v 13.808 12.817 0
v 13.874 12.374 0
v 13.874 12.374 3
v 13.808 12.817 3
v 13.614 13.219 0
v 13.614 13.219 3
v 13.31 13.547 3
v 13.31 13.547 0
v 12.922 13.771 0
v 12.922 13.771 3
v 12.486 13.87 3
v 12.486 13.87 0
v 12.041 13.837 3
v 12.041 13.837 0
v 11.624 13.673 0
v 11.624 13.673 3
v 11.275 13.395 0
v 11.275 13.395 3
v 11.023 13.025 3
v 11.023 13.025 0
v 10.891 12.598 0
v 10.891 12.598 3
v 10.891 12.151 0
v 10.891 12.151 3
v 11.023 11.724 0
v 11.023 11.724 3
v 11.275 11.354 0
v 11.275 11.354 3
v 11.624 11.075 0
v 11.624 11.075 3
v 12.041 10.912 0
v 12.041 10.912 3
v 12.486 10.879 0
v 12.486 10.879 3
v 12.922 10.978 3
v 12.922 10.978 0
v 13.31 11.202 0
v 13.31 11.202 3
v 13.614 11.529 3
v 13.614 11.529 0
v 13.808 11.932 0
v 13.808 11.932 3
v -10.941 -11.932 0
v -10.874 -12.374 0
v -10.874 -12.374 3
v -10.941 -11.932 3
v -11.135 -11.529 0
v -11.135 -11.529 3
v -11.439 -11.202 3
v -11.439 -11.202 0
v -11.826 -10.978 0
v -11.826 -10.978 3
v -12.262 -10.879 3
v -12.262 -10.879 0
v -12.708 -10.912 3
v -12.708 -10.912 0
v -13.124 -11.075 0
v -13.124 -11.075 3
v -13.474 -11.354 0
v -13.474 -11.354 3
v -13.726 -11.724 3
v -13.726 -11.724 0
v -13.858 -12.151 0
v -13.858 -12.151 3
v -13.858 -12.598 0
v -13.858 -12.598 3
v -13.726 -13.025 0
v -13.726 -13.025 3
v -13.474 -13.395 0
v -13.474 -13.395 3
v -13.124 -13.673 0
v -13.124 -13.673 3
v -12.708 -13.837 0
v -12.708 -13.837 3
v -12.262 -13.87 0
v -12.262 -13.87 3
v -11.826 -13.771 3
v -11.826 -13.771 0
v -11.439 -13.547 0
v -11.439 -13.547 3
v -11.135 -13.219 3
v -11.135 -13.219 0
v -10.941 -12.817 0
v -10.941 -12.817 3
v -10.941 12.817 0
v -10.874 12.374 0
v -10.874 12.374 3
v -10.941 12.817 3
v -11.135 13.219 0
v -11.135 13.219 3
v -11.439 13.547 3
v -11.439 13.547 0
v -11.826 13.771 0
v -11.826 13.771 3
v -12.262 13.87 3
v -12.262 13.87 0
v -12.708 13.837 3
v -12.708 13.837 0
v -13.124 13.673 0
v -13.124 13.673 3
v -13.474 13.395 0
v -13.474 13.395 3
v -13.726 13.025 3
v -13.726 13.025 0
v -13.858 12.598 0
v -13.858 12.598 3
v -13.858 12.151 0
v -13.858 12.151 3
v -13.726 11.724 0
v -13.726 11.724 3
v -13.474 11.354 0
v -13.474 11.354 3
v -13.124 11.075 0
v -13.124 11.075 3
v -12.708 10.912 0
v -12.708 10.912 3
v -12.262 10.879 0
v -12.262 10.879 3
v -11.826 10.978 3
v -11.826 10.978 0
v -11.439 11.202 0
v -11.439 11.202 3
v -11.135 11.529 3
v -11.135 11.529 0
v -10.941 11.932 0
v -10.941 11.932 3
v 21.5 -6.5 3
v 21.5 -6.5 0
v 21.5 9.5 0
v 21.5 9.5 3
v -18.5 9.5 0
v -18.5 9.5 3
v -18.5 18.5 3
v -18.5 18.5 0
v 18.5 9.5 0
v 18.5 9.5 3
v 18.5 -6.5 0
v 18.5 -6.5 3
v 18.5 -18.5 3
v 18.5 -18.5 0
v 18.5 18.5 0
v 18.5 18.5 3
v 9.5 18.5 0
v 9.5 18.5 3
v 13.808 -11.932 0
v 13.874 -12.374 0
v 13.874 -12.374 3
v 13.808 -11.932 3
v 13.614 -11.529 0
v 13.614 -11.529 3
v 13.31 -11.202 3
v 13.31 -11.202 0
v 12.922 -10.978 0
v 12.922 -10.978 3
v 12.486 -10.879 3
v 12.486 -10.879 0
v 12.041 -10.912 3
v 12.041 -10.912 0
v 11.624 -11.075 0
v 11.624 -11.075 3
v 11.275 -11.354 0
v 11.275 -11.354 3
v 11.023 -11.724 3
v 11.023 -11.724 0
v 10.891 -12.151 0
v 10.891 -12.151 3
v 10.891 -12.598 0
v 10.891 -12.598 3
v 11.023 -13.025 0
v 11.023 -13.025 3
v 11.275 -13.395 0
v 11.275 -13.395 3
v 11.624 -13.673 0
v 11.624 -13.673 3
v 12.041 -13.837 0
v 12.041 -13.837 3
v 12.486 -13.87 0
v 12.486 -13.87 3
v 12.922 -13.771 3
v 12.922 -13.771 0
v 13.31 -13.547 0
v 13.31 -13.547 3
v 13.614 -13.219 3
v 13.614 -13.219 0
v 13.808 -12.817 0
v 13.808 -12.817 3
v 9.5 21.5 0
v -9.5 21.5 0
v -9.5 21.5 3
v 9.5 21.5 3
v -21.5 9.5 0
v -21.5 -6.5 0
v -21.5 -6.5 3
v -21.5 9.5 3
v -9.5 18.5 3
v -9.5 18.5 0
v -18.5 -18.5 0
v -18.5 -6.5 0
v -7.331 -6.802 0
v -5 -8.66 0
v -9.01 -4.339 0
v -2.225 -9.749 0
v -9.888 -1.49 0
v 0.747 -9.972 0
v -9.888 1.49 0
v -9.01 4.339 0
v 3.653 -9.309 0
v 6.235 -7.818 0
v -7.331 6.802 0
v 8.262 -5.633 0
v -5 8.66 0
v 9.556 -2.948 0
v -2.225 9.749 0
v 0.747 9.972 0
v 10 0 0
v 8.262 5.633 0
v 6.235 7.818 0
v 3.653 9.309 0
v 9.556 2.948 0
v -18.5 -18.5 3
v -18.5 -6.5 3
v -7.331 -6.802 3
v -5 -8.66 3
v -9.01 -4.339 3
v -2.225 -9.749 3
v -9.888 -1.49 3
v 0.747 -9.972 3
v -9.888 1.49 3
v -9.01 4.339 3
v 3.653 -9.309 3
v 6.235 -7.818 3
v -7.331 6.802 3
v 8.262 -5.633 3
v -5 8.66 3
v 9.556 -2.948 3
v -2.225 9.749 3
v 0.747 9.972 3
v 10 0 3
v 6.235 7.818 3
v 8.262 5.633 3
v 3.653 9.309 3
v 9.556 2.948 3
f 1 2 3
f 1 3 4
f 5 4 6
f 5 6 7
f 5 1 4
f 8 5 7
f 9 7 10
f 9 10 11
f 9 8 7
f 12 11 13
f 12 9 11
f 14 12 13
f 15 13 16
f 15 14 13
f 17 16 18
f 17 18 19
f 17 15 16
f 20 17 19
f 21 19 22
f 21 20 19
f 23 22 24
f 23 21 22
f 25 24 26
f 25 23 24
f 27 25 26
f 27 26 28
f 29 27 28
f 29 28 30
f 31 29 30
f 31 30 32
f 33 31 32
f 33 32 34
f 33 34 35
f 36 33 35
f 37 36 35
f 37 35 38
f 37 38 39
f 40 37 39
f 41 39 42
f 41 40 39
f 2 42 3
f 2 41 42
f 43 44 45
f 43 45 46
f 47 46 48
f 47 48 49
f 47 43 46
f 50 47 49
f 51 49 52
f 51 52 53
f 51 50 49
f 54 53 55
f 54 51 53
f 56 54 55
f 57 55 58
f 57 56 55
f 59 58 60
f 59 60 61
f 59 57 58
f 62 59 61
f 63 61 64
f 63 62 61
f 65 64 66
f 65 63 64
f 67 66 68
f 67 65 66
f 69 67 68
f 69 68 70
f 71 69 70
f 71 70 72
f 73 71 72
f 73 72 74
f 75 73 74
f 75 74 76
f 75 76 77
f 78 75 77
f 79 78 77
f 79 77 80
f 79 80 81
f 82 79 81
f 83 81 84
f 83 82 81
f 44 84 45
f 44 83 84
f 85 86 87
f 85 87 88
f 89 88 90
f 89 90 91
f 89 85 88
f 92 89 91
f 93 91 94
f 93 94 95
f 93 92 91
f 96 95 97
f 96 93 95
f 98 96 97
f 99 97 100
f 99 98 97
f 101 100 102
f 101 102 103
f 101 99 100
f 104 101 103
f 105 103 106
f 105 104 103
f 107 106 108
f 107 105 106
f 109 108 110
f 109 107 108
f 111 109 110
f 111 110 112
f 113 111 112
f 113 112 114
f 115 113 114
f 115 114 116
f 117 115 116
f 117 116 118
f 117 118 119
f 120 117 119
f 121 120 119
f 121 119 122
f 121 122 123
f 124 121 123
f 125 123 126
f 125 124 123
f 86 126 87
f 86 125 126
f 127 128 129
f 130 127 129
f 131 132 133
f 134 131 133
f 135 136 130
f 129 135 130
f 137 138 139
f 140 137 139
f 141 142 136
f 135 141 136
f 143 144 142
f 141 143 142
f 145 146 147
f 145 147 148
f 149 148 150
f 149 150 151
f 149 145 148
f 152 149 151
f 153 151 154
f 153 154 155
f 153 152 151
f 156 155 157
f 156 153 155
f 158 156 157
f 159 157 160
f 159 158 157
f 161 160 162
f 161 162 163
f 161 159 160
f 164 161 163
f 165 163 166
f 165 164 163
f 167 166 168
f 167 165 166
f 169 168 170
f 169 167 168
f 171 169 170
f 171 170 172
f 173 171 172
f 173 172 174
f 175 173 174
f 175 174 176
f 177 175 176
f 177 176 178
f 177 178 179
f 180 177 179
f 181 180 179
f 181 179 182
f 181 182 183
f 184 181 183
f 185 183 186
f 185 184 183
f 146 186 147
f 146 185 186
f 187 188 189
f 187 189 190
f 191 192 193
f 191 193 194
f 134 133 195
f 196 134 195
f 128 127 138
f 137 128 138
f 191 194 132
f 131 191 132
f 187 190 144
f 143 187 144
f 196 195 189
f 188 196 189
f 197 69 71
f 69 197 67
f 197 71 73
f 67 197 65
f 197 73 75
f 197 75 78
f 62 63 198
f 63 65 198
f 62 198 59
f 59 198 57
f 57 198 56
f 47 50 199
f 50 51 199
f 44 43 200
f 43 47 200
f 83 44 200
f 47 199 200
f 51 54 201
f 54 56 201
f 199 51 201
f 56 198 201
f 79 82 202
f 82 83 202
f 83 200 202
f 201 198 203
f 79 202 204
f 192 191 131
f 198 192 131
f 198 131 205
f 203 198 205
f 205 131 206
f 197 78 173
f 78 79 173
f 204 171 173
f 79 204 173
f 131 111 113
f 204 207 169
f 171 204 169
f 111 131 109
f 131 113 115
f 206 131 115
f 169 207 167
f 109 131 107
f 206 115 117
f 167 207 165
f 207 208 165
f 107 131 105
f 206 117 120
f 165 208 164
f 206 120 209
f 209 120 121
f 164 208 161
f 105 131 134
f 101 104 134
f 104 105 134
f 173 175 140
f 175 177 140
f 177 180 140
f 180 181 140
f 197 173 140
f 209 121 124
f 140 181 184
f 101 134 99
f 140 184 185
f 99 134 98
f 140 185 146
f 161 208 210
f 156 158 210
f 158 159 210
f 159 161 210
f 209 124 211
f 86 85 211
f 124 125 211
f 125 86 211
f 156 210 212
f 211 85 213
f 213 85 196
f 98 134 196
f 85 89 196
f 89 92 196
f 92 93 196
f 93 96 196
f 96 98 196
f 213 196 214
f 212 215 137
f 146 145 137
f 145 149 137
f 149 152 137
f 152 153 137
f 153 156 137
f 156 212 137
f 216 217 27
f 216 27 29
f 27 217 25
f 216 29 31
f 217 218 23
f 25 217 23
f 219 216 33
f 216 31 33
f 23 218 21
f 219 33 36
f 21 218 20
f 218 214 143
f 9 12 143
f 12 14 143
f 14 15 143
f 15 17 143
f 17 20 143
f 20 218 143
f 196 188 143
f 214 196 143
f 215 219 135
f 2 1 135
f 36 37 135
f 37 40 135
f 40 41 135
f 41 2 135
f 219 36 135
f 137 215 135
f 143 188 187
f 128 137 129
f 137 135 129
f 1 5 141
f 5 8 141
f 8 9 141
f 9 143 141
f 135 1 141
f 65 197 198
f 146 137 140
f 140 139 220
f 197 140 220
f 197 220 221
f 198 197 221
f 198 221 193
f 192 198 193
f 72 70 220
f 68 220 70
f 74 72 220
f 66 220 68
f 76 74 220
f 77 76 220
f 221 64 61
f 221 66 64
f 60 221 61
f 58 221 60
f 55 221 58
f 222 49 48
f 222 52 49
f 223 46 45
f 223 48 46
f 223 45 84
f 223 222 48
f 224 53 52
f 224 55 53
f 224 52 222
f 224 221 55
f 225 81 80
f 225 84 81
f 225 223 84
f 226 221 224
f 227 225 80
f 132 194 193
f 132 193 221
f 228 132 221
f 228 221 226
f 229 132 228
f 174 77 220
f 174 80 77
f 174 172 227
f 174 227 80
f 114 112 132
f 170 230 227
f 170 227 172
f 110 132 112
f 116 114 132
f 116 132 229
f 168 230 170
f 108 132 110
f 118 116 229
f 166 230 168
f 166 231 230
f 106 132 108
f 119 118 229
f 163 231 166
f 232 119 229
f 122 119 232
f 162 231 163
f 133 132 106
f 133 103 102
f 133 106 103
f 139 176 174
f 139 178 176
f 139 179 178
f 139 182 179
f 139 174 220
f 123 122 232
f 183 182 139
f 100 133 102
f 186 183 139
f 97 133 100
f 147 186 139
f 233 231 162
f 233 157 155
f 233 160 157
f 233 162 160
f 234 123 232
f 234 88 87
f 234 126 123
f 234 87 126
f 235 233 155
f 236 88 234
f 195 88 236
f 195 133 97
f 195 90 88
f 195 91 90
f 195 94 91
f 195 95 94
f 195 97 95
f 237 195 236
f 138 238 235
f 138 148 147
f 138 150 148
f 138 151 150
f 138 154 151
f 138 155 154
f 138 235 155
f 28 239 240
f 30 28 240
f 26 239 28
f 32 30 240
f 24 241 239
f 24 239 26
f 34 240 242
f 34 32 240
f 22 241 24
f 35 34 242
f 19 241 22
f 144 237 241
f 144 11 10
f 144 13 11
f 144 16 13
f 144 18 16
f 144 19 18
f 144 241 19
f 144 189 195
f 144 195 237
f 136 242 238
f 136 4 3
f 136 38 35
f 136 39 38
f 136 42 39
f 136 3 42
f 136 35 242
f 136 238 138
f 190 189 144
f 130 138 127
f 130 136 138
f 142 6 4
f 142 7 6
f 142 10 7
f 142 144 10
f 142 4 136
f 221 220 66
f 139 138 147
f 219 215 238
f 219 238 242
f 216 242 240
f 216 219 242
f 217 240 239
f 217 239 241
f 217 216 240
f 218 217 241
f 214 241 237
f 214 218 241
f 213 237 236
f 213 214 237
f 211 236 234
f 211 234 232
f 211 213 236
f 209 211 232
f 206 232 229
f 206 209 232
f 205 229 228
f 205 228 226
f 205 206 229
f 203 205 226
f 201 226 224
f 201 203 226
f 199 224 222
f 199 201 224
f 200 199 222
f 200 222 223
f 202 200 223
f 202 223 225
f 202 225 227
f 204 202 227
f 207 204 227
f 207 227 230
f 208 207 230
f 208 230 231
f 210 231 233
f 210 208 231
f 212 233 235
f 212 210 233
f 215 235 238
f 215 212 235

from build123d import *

# Parameters (mm, degrees)
SKETCH1_W           = 43
SKETCH1_H           = 43
SKETCH1_R           = 1.5
SKETCH1_R_2         = 10
BOSS_EXTRUDE1_DEPTH = 3
CUT_EXTRUDE1_DEPTH  = 3


with BuildPart() as part:
    # Sketch1 → Boss-Extrude1 (new body)
    with BuildSketch(Plane.XY):
        Rectangle(SKETCH1_W, SKETCH1_H)
        with Locations((-12.374368671, 12.374368671)):
            Circle(SKETCH1_R, mode=Mode.SUBTRACT)
        with Locations((12.374368671, -12.374368671)):
            Circle(SKETCH1_R, mode=Mode.SUBTRACT)
        with Locations((12.374368671, 12.374368671)):
            Circle(SKETCH1_R, mode=Mode.SUBTRACT)
        with Locations((-12.374368671, -12.374368671)):
            Circle(SKETCH1_R, mode=Mode.SUBTRACT)
        Circle(SKETCH1_R_2, mode=Mode.SUBTRACT)
    extrude(amount=BOSS_EXTRUDE1_DEPTH)

    # Sketch2 → Cut-Extrude1 (cut)
    with BuildSketch(Plane.XY.offset(3)):
        Polygon((-21.5, -21.5), (21.5, -21.5), (21.5, -18.5), (21.5, -6.5), (18.5, -6.5), (18.5, -18.5), (-18.5, -18.5), (-18.5, -6.5), (-21.5, -6.5), (-21.5, -18.5), align=None)
        Polygon((-21.5, 9.5), (-18.5, 9.5), (-18.5, 18.5), (-9.5, 18.5), (-9.5, 21.5), (-21.5, 21.5), align=None)
        Polygon((21.5, 9.5), (21.5, 21.5), (9.5, 21.5), (9.5, 18.5), (18.5, 18.5), (18.5, 9.5), align=None)
    extrude(amount=-CUT_EXTRUDE1_DEPTH, mode=Mode.SUBTRACT)


solid = part.part
